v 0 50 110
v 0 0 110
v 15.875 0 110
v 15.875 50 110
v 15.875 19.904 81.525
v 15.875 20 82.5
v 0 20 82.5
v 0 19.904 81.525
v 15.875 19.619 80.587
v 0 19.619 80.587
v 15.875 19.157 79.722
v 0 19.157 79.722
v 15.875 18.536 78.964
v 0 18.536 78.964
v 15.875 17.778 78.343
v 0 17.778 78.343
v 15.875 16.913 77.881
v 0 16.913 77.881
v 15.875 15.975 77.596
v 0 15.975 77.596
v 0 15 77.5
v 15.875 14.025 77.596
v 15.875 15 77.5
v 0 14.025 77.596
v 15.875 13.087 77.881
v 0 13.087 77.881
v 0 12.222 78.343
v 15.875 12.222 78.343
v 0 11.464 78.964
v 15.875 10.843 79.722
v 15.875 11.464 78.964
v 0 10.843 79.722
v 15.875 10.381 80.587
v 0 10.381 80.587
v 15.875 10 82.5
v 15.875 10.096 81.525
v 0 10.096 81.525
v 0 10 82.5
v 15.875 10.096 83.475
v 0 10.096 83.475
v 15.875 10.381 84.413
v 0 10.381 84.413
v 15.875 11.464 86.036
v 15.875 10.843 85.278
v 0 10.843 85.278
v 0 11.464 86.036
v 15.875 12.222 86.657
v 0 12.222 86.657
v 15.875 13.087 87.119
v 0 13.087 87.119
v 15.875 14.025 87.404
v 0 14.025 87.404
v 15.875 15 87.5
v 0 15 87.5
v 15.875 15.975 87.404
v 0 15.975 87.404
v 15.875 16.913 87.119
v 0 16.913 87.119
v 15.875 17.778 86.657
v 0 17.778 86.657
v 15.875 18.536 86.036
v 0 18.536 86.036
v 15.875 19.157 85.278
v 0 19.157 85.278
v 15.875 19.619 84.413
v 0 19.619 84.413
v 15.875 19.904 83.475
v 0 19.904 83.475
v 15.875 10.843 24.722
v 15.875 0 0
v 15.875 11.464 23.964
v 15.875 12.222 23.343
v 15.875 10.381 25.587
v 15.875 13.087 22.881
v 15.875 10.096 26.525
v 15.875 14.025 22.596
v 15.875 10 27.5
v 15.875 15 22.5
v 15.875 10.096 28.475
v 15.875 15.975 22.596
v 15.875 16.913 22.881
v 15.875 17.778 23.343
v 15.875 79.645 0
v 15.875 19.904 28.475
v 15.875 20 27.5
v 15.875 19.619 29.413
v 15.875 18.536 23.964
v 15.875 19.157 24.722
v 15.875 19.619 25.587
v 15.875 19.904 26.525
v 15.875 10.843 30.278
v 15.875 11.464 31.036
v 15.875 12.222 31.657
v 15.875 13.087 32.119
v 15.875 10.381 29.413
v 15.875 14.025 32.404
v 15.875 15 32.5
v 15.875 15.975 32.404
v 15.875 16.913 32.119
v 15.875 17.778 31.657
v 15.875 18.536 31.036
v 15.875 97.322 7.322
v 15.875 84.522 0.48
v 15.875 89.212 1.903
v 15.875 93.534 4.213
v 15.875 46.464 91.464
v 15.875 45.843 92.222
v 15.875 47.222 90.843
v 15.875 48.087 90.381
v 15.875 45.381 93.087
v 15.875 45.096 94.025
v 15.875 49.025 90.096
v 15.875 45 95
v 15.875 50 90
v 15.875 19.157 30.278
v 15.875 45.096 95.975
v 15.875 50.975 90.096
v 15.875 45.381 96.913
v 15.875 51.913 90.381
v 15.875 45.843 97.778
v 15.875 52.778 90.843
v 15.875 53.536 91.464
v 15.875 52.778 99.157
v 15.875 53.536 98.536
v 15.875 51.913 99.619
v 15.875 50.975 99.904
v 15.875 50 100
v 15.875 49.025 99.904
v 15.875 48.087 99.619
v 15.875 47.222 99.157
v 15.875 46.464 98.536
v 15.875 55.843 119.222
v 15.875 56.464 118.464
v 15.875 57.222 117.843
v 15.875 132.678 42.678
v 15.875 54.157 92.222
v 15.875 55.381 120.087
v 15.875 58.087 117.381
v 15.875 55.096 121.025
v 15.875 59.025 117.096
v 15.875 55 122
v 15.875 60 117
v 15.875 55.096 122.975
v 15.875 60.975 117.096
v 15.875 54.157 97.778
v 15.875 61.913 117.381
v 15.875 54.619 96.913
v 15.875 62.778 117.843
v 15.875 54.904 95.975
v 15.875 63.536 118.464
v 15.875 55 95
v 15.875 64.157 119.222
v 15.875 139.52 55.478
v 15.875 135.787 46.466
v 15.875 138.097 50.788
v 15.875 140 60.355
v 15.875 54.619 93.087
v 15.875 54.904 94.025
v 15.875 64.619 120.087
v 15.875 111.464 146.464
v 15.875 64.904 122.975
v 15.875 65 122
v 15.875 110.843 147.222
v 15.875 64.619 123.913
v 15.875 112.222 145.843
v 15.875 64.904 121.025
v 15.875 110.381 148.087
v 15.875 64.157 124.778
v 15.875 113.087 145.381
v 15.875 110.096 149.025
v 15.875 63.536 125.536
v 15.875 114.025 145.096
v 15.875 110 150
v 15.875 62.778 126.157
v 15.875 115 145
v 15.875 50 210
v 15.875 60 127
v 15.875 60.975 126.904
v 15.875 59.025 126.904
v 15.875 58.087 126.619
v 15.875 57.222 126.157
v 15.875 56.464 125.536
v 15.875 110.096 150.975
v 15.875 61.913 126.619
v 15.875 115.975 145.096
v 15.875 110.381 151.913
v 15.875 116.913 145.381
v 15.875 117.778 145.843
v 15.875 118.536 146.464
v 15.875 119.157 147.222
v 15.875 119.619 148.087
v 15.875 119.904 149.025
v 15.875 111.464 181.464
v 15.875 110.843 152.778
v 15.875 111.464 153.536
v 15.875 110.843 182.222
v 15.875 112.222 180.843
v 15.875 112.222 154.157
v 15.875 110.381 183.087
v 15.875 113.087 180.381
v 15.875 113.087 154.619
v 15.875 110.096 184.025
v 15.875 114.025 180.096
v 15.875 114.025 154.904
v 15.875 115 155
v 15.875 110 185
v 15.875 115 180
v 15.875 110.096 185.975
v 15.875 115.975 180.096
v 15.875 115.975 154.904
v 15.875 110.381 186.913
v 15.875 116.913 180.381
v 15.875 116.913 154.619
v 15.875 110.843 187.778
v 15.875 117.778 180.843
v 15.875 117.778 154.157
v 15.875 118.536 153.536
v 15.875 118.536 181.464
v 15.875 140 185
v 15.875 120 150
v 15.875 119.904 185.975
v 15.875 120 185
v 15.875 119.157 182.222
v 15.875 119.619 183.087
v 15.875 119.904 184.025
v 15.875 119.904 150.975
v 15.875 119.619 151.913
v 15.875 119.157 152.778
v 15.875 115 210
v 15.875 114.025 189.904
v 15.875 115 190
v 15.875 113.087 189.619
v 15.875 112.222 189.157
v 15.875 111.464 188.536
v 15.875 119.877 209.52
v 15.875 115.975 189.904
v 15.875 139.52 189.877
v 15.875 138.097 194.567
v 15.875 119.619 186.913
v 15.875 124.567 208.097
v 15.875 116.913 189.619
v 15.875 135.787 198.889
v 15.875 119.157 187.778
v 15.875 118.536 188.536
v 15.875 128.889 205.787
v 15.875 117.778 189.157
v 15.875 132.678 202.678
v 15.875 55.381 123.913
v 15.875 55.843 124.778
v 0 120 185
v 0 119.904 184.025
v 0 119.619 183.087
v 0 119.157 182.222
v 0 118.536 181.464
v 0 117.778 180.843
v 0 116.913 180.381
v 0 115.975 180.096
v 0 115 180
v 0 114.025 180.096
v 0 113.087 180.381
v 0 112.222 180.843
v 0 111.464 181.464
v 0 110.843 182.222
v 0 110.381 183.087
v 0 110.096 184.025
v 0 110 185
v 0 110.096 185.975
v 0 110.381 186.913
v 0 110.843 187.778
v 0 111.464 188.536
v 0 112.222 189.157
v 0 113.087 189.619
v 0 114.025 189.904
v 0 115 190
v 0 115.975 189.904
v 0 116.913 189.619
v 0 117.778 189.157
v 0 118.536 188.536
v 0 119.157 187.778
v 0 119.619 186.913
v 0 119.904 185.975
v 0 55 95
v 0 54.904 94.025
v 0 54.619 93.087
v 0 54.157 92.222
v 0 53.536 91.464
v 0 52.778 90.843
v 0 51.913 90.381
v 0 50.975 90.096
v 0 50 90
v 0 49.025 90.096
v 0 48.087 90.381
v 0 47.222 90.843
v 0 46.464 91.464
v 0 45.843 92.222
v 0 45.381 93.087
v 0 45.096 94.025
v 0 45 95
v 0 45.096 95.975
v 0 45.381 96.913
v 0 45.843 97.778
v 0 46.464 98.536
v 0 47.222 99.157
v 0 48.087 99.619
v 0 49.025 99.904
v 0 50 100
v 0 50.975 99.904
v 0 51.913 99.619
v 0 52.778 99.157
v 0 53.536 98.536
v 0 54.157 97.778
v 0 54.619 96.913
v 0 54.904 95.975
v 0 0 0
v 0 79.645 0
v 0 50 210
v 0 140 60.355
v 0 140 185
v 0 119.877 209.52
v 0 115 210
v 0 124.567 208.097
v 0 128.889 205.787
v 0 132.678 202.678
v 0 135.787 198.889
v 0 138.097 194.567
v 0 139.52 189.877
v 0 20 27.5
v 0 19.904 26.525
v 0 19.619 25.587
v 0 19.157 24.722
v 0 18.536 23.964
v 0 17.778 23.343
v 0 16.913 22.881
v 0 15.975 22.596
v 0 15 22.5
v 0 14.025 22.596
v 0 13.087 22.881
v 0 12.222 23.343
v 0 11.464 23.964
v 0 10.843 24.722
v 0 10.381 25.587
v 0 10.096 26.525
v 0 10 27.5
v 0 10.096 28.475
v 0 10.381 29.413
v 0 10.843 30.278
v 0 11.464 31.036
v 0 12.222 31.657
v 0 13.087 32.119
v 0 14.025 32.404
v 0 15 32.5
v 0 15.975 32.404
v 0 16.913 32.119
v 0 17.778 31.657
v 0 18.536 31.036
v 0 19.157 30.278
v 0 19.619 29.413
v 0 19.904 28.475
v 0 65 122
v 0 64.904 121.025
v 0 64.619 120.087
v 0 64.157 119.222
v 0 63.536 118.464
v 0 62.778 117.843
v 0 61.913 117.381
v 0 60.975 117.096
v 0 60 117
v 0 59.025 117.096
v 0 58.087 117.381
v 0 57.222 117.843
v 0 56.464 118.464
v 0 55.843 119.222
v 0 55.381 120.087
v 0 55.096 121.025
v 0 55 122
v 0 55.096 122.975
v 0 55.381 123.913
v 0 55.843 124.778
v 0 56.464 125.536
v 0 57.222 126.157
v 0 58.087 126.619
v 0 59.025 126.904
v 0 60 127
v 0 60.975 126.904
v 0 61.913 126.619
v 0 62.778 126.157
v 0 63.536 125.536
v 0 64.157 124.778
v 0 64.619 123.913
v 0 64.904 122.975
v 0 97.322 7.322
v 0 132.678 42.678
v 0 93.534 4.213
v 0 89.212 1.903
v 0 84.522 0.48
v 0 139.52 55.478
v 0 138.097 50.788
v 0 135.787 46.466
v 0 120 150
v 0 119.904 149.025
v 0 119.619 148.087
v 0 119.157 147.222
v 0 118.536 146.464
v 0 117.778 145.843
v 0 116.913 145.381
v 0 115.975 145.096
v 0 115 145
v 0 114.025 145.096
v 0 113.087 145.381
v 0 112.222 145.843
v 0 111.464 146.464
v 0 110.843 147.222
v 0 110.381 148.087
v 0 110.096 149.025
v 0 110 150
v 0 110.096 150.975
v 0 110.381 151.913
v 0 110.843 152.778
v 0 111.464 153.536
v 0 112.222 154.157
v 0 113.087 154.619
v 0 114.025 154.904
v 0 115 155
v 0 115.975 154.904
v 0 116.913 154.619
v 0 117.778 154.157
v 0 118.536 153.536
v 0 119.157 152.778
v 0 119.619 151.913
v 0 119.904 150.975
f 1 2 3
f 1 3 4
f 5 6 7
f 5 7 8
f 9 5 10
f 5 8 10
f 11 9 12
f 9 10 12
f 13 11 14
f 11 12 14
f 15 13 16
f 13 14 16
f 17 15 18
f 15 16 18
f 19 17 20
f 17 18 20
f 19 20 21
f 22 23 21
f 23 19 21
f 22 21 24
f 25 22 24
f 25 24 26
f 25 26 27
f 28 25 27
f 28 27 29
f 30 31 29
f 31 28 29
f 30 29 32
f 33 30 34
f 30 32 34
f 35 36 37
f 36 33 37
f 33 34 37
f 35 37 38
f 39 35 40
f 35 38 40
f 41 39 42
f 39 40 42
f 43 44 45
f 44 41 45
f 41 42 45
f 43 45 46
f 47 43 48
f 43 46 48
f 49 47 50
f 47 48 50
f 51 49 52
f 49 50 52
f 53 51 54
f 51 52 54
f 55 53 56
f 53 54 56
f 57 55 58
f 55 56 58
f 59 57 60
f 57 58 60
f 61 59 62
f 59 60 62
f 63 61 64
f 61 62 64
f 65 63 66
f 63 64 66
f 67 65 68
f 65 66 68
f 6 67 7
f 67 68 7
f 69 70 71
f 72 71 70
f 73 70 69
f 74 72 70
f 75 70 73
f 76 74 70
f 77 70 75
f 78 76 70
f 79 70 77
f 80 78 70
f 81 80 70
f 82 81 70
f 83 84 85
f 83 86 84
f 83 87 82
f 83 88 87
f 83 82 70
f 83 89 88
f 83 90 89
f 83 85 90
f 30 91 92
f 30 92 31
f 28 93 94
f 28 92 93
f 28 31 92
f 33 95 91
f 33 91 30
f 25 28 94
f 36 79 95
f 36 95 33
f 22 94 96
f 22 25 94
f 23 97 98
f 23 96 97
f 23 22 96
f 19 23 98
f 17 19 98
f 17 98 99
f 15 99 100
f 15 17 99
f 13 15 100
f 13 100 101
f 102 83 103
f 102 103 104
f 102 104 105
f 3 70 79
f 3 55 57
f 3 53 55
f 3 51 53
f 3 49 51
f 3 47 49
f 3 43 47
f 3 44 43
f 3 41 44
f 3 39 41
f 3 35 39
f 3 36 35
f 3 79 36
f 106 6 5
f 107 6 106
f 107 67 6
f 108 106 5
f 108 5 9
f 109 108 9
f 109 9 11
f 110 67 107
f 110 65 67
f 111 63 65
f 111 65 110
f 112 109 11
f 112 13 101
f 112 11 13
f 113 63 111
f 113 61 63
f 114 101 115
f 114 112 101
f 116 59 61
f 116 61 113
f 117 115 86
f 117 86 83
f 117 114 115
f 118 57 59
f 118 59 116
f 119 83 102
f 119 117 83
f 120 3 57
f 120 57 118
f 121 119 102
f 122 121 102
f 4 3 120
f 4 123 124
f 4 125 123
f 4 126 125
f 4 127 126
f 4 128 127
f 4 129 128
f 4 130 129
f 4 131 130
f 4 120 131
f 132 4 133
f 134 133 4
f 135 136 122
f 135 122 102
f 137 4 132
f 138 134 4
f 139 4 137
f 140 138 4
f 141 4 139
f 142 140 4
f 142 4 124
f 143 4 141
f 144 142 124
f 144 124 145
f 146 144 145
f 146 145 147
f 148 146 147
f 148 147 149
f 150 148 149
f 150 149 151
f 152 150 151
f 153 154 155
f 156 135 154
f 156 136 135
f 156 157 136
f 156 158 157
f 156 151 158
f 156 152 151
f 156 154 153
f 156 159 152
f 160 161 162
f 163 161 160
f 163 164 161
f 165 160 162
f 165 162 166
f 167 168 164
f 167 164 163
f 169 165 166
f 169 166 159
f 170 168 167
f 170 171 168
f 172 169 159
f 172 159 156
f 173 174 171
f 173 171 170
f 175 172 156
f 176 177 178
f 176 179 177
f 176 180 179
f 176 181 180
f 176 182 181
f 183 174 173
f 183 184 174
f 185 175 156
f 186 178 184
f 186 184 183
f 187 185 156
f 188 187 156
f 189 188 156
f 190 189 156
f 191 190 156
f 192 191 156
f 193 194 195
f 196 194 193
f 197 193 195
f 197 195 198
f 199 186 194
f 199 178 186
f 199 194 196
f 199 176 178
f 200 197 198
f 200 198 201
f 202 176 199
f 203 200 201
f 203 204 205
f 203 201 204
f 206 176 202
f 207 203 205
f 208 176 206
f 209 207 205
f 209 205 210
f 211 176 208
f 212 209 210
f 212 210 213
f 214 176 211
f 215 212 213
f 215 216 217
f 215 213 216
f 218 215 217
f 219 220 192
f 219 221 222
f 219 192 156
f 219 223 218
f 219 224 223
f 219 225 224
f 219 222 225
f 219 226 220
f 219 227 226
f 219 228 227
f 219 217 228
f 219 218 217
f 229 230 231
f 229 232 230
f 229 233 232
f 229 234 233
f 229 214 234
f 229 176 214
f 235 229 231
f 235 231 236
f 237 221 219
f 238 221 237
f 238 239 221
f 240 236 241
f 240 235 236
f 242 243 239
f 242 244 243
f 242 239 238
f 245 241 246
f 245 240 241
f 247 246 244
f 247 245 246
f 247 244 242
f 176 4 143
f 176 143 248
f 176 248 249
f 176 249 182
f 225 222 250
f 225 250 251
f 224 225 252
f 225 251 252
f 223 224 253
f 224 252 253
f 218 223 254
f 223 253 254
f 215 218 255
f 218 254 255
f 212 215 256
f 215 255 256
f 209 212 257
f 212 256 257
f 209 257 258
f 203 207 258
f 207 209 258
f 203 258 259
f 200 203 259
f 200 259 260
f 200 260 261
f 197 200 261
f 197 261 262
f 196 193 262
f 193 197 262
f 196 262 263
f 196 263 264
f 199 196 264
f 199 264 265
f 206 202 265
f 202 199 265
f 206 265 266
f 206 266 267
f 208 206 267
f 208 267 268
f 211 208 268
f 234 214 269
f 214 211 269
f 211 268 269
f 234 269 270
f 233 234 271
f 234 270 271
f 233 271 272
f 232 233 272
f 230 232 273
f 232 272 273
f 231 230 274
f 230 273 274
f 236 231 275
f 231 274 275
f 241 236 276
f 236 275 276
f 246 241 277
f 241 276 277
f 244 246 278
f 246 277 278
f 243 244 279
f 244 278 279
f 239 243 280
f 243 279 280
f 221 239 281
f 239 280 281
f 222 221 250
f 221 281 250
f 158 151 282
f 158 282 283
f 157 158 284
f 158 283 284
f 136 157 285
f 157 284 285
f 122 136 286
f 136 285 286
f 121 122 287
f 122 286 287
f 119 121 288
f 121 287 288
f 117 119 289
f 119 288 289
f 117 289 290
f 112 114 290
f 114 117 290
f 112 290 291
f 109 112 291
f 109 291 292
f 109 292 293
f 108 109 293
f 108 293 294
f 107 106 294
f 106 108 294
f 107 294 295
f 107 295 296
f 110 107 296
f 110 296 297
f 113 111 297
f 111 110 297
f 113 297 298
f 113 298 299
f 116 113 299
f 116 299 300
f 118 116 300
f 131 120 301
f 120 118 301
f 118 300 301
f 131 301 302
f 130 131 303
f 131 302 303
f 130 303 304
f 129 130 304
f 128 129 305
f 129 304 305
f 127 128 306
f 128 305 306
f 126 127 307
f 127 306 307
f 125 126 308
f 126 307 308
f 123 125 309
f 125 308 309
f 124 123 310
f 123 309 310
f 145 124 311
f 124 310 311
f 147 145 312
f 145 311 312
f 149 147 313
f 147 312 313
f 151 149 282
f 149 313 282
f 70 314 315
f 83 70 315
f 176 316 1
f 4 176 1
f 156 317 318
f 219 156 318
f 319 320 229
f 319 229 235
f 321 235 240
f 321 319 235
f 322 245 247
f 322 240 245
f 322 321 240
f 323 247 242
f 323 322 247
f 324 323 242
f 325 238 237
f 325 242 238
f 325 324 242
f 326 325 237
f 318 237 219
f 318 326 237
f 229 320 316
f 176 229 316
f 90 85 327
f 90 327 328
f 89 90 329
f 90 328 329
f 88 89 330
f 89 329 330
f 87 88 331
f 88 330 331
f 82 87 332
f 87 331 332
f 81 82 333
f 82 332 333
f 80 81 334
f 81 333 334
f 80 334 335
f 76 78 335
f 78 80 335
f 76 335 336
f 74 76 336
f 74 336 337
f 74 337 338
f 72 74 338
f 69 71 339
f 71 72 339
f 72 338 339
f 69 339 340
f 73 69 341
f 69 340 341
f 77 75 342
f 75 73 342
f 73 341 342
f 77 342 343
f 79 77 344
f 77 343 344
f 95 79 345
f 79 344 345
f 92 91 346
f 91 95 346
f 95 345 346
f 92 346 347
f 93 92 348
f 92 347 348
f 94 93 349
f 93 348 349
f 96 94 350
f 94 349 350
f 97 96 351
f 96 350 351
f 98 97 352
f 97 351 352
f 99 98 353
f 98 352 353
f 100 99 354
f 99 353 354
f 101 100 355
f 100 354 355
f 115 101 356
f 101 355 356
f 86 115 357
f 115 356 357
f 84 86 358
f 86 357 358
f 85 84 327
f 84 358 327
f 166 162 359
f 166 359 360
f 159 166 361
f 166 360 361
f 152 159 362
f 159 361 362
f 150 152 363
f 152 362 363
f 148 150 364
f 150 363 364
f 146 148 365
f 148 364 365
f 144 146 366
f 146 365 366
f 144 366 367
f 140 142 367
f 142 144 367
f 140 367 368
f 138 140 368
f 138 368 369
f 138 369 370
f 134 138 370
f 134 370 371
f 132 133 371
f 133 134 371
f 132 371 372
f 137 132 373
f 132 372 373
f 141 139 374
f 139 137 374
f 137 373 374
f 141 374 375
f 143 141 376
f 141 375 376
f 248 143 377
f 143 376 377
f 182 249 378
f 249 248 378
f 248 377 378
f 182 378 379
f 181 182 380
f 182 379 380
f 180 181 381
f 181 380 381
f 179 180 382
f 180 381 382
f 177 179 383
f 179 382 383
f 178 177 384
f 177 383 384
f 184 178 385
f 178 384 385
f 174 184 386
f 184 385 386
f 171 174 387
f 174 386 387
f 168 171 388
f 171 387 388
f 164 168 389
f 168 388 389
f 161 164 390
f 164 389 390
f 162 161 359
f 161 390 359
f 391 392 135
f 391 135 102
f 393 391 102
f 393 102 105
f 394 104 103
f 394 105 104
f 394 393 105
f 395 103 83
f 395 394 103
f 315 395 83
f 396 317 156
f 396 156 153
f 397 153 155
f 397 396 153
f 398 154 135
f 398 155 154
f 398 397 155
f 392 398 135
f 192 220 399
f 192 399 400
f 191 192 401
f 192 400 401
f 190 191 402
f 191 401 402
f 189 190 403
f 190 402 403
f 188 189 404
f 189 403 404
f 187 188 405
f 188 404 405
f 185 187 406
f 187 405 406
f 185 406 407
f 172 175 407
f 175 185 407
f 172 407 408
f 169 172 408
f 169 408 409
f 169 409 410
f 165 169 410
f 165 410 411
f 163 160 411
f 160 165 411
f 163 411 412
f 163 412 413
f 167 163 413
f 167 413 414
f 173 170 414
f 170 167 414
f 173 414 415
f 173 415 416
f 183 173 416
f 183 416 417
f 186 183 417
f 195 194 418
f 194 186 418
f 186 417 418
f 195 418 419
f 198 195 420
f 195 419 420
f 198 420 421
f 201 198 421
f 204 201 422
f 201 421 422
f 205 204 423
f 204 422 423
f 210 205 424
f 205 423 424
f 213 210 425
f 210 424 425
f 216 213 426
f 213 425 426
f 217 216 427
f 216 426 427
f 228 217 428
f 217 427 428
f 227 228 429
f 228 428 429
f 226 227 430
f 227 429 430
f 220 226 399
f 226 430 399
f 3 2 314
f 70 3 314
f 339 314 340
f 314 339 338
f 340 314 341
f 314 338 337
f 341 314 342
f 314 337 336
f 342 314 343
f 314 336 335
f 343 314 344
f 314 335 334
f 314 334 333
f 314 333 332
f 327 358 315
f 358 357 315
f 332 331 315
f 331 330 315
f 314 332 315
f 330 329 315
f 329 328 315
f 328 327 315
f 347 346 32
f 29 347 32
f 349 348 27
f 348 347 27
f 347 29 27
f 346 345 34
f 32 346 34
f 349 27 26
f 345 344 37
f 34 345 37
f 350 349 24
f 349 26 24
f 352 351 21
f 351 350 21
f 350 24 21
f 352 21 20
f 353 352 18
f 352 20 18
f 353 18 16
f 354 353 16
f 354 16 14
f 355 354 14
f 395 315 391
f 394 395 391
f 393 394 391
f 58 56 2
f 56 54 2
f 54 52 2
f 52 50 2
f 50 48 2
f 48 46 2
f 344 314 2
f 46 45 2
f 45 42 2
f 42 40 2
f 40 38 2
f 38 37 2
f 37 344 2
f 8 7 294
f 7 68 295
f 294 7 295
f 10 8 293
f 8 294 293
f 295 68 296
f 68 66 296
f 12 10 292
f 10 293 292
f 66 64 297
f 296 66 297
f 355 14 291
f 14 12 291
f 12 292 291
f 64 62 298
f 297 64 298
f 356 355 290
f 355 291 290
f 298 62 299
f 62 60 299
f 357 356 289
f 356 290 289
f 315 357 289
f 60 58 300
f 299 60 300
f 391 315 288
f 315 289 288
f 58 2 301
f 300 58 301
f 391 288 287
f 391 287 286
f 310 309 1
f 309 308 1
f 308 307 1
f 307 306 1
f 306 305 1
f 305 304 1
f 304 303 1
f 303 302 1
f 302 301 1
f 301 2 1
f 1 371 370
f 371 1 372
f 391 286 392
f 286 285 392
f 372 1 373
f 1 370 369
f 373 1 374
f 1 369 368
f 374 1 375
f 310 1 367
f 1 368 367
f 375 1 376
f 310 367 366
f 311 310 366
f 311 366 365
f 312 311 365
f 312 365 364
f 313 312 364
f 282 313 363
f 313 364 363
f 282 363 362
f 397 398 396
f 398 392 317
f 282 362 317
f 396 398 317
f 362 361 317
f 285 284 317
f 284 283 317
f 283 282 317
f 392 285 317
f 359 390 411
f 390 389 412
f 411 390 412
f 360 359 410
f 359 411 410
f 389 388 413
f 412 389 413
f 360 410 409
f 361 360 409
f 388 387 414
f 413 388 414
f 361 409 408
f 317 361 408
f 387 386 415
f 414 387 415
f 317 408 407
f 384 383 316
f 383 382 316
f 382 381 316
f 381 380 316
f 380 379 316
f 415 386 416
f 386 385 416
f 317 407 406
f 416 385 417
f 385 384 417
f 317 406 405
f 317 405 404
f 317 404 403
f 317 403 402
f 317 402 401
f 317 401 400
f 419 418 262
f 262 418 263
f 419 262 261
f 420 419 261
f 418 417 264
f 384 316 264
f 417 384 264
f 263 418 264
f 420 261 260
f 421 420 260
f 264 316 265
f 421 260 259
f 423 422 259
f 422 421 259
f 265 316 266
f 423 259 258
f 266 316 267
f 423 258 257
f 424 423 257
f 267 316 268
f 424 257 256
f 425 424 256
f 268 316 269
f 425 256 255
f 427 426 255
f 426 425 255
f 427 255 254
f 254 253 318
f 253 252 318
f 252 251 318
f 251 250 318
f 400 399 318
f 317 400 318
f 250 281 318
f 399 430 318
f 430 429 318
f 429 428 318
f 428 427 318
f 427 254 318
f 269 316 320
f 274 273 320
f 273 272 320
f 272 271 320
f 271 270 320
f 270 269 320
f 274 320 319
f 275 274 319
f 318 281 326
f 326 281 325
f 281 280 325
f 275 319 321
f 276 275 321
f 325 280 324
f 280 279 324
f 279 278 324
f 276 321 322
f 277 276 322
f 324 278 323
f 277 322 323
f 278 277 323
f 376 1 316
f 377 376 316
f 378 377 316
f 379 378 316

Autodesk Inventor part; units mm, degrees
ref_plane "YZ Plane" through (0, 0, 0) normal (1, 0, 0) x (0, 1, 0)
ref_plane "XZ Plane" through (0, 0, 0) normal (0, 1, 0) x (-1, 0, 0)
ref_plane "XY Plane" through (0, 0, 0) normal (0, 0, 1) x (1, 0, 0)
sketch "Sketch1" plane through (0, 0, 0) normal (1, 0, 0) x (0, 1, 0)
  line L0 (0, 0) -> (79.6447, 0)
  line L1 (140, 60.3553) -> (140, 185)
  line L2 (115, 210) -> (50, 210)
  line L3 (0, 110) -> (0, 0)
  arc A0 (140, 185) -> (115, 210) centre (115, 185) ccw
  line L4 (50, 210) -> (50, 110)
  line L5 (0, 110) -> (50, 110)
  circle A1 centre (115, 185) radius 5
  circle A2 centre (115, 150) radius 5
  circle A3 centre (60, 122) radius 5
  circle A4 centre (50, 95) radius 5
  line L6 (132.6777, 42.6777) -> (97.3223, 7.3223)
  arc A5 (132.6777, 42.6777) -> (140, 60.3553) centre (115, 60.3553) ccw
  arc A6 (79.6447, 0) -> (97.3223, 7.3223) centre (79.6447, 25) ccw
  circle A7 centre (15, 82.5) radius 5
  circle A8 centre (15, 27.5) radius 5
  point P0 (140, 210)
  point P1 (90, 0)
  dimension "d2" = 25
  dimension "d3" = 90
  dimension "d4" = 110
  dimension "d5" = 140
  dimension "d6" = 10
  dimension "d7" = 88
  dimension "d8" = 10
  dimension "d9" = 15
  dimension "d10" = 25
  dimension "d11" = 35
  dimension "d12" = 25
  dimension "d13" = 50
  dimension "d14" = 45
  dimension "d15" = 210
  dimension "d16" = 25
  dimension "d17" = 25
  dimension "d20" = 55
  dimension "d21" = 27.5
  dimension "d22" = 35
  dimension "d23" = 10
extrude "Extrusion1" add sketch "Sketch1" along normal blind 15.875
properties part number "bodytoppart" material "Steel, Mild"
